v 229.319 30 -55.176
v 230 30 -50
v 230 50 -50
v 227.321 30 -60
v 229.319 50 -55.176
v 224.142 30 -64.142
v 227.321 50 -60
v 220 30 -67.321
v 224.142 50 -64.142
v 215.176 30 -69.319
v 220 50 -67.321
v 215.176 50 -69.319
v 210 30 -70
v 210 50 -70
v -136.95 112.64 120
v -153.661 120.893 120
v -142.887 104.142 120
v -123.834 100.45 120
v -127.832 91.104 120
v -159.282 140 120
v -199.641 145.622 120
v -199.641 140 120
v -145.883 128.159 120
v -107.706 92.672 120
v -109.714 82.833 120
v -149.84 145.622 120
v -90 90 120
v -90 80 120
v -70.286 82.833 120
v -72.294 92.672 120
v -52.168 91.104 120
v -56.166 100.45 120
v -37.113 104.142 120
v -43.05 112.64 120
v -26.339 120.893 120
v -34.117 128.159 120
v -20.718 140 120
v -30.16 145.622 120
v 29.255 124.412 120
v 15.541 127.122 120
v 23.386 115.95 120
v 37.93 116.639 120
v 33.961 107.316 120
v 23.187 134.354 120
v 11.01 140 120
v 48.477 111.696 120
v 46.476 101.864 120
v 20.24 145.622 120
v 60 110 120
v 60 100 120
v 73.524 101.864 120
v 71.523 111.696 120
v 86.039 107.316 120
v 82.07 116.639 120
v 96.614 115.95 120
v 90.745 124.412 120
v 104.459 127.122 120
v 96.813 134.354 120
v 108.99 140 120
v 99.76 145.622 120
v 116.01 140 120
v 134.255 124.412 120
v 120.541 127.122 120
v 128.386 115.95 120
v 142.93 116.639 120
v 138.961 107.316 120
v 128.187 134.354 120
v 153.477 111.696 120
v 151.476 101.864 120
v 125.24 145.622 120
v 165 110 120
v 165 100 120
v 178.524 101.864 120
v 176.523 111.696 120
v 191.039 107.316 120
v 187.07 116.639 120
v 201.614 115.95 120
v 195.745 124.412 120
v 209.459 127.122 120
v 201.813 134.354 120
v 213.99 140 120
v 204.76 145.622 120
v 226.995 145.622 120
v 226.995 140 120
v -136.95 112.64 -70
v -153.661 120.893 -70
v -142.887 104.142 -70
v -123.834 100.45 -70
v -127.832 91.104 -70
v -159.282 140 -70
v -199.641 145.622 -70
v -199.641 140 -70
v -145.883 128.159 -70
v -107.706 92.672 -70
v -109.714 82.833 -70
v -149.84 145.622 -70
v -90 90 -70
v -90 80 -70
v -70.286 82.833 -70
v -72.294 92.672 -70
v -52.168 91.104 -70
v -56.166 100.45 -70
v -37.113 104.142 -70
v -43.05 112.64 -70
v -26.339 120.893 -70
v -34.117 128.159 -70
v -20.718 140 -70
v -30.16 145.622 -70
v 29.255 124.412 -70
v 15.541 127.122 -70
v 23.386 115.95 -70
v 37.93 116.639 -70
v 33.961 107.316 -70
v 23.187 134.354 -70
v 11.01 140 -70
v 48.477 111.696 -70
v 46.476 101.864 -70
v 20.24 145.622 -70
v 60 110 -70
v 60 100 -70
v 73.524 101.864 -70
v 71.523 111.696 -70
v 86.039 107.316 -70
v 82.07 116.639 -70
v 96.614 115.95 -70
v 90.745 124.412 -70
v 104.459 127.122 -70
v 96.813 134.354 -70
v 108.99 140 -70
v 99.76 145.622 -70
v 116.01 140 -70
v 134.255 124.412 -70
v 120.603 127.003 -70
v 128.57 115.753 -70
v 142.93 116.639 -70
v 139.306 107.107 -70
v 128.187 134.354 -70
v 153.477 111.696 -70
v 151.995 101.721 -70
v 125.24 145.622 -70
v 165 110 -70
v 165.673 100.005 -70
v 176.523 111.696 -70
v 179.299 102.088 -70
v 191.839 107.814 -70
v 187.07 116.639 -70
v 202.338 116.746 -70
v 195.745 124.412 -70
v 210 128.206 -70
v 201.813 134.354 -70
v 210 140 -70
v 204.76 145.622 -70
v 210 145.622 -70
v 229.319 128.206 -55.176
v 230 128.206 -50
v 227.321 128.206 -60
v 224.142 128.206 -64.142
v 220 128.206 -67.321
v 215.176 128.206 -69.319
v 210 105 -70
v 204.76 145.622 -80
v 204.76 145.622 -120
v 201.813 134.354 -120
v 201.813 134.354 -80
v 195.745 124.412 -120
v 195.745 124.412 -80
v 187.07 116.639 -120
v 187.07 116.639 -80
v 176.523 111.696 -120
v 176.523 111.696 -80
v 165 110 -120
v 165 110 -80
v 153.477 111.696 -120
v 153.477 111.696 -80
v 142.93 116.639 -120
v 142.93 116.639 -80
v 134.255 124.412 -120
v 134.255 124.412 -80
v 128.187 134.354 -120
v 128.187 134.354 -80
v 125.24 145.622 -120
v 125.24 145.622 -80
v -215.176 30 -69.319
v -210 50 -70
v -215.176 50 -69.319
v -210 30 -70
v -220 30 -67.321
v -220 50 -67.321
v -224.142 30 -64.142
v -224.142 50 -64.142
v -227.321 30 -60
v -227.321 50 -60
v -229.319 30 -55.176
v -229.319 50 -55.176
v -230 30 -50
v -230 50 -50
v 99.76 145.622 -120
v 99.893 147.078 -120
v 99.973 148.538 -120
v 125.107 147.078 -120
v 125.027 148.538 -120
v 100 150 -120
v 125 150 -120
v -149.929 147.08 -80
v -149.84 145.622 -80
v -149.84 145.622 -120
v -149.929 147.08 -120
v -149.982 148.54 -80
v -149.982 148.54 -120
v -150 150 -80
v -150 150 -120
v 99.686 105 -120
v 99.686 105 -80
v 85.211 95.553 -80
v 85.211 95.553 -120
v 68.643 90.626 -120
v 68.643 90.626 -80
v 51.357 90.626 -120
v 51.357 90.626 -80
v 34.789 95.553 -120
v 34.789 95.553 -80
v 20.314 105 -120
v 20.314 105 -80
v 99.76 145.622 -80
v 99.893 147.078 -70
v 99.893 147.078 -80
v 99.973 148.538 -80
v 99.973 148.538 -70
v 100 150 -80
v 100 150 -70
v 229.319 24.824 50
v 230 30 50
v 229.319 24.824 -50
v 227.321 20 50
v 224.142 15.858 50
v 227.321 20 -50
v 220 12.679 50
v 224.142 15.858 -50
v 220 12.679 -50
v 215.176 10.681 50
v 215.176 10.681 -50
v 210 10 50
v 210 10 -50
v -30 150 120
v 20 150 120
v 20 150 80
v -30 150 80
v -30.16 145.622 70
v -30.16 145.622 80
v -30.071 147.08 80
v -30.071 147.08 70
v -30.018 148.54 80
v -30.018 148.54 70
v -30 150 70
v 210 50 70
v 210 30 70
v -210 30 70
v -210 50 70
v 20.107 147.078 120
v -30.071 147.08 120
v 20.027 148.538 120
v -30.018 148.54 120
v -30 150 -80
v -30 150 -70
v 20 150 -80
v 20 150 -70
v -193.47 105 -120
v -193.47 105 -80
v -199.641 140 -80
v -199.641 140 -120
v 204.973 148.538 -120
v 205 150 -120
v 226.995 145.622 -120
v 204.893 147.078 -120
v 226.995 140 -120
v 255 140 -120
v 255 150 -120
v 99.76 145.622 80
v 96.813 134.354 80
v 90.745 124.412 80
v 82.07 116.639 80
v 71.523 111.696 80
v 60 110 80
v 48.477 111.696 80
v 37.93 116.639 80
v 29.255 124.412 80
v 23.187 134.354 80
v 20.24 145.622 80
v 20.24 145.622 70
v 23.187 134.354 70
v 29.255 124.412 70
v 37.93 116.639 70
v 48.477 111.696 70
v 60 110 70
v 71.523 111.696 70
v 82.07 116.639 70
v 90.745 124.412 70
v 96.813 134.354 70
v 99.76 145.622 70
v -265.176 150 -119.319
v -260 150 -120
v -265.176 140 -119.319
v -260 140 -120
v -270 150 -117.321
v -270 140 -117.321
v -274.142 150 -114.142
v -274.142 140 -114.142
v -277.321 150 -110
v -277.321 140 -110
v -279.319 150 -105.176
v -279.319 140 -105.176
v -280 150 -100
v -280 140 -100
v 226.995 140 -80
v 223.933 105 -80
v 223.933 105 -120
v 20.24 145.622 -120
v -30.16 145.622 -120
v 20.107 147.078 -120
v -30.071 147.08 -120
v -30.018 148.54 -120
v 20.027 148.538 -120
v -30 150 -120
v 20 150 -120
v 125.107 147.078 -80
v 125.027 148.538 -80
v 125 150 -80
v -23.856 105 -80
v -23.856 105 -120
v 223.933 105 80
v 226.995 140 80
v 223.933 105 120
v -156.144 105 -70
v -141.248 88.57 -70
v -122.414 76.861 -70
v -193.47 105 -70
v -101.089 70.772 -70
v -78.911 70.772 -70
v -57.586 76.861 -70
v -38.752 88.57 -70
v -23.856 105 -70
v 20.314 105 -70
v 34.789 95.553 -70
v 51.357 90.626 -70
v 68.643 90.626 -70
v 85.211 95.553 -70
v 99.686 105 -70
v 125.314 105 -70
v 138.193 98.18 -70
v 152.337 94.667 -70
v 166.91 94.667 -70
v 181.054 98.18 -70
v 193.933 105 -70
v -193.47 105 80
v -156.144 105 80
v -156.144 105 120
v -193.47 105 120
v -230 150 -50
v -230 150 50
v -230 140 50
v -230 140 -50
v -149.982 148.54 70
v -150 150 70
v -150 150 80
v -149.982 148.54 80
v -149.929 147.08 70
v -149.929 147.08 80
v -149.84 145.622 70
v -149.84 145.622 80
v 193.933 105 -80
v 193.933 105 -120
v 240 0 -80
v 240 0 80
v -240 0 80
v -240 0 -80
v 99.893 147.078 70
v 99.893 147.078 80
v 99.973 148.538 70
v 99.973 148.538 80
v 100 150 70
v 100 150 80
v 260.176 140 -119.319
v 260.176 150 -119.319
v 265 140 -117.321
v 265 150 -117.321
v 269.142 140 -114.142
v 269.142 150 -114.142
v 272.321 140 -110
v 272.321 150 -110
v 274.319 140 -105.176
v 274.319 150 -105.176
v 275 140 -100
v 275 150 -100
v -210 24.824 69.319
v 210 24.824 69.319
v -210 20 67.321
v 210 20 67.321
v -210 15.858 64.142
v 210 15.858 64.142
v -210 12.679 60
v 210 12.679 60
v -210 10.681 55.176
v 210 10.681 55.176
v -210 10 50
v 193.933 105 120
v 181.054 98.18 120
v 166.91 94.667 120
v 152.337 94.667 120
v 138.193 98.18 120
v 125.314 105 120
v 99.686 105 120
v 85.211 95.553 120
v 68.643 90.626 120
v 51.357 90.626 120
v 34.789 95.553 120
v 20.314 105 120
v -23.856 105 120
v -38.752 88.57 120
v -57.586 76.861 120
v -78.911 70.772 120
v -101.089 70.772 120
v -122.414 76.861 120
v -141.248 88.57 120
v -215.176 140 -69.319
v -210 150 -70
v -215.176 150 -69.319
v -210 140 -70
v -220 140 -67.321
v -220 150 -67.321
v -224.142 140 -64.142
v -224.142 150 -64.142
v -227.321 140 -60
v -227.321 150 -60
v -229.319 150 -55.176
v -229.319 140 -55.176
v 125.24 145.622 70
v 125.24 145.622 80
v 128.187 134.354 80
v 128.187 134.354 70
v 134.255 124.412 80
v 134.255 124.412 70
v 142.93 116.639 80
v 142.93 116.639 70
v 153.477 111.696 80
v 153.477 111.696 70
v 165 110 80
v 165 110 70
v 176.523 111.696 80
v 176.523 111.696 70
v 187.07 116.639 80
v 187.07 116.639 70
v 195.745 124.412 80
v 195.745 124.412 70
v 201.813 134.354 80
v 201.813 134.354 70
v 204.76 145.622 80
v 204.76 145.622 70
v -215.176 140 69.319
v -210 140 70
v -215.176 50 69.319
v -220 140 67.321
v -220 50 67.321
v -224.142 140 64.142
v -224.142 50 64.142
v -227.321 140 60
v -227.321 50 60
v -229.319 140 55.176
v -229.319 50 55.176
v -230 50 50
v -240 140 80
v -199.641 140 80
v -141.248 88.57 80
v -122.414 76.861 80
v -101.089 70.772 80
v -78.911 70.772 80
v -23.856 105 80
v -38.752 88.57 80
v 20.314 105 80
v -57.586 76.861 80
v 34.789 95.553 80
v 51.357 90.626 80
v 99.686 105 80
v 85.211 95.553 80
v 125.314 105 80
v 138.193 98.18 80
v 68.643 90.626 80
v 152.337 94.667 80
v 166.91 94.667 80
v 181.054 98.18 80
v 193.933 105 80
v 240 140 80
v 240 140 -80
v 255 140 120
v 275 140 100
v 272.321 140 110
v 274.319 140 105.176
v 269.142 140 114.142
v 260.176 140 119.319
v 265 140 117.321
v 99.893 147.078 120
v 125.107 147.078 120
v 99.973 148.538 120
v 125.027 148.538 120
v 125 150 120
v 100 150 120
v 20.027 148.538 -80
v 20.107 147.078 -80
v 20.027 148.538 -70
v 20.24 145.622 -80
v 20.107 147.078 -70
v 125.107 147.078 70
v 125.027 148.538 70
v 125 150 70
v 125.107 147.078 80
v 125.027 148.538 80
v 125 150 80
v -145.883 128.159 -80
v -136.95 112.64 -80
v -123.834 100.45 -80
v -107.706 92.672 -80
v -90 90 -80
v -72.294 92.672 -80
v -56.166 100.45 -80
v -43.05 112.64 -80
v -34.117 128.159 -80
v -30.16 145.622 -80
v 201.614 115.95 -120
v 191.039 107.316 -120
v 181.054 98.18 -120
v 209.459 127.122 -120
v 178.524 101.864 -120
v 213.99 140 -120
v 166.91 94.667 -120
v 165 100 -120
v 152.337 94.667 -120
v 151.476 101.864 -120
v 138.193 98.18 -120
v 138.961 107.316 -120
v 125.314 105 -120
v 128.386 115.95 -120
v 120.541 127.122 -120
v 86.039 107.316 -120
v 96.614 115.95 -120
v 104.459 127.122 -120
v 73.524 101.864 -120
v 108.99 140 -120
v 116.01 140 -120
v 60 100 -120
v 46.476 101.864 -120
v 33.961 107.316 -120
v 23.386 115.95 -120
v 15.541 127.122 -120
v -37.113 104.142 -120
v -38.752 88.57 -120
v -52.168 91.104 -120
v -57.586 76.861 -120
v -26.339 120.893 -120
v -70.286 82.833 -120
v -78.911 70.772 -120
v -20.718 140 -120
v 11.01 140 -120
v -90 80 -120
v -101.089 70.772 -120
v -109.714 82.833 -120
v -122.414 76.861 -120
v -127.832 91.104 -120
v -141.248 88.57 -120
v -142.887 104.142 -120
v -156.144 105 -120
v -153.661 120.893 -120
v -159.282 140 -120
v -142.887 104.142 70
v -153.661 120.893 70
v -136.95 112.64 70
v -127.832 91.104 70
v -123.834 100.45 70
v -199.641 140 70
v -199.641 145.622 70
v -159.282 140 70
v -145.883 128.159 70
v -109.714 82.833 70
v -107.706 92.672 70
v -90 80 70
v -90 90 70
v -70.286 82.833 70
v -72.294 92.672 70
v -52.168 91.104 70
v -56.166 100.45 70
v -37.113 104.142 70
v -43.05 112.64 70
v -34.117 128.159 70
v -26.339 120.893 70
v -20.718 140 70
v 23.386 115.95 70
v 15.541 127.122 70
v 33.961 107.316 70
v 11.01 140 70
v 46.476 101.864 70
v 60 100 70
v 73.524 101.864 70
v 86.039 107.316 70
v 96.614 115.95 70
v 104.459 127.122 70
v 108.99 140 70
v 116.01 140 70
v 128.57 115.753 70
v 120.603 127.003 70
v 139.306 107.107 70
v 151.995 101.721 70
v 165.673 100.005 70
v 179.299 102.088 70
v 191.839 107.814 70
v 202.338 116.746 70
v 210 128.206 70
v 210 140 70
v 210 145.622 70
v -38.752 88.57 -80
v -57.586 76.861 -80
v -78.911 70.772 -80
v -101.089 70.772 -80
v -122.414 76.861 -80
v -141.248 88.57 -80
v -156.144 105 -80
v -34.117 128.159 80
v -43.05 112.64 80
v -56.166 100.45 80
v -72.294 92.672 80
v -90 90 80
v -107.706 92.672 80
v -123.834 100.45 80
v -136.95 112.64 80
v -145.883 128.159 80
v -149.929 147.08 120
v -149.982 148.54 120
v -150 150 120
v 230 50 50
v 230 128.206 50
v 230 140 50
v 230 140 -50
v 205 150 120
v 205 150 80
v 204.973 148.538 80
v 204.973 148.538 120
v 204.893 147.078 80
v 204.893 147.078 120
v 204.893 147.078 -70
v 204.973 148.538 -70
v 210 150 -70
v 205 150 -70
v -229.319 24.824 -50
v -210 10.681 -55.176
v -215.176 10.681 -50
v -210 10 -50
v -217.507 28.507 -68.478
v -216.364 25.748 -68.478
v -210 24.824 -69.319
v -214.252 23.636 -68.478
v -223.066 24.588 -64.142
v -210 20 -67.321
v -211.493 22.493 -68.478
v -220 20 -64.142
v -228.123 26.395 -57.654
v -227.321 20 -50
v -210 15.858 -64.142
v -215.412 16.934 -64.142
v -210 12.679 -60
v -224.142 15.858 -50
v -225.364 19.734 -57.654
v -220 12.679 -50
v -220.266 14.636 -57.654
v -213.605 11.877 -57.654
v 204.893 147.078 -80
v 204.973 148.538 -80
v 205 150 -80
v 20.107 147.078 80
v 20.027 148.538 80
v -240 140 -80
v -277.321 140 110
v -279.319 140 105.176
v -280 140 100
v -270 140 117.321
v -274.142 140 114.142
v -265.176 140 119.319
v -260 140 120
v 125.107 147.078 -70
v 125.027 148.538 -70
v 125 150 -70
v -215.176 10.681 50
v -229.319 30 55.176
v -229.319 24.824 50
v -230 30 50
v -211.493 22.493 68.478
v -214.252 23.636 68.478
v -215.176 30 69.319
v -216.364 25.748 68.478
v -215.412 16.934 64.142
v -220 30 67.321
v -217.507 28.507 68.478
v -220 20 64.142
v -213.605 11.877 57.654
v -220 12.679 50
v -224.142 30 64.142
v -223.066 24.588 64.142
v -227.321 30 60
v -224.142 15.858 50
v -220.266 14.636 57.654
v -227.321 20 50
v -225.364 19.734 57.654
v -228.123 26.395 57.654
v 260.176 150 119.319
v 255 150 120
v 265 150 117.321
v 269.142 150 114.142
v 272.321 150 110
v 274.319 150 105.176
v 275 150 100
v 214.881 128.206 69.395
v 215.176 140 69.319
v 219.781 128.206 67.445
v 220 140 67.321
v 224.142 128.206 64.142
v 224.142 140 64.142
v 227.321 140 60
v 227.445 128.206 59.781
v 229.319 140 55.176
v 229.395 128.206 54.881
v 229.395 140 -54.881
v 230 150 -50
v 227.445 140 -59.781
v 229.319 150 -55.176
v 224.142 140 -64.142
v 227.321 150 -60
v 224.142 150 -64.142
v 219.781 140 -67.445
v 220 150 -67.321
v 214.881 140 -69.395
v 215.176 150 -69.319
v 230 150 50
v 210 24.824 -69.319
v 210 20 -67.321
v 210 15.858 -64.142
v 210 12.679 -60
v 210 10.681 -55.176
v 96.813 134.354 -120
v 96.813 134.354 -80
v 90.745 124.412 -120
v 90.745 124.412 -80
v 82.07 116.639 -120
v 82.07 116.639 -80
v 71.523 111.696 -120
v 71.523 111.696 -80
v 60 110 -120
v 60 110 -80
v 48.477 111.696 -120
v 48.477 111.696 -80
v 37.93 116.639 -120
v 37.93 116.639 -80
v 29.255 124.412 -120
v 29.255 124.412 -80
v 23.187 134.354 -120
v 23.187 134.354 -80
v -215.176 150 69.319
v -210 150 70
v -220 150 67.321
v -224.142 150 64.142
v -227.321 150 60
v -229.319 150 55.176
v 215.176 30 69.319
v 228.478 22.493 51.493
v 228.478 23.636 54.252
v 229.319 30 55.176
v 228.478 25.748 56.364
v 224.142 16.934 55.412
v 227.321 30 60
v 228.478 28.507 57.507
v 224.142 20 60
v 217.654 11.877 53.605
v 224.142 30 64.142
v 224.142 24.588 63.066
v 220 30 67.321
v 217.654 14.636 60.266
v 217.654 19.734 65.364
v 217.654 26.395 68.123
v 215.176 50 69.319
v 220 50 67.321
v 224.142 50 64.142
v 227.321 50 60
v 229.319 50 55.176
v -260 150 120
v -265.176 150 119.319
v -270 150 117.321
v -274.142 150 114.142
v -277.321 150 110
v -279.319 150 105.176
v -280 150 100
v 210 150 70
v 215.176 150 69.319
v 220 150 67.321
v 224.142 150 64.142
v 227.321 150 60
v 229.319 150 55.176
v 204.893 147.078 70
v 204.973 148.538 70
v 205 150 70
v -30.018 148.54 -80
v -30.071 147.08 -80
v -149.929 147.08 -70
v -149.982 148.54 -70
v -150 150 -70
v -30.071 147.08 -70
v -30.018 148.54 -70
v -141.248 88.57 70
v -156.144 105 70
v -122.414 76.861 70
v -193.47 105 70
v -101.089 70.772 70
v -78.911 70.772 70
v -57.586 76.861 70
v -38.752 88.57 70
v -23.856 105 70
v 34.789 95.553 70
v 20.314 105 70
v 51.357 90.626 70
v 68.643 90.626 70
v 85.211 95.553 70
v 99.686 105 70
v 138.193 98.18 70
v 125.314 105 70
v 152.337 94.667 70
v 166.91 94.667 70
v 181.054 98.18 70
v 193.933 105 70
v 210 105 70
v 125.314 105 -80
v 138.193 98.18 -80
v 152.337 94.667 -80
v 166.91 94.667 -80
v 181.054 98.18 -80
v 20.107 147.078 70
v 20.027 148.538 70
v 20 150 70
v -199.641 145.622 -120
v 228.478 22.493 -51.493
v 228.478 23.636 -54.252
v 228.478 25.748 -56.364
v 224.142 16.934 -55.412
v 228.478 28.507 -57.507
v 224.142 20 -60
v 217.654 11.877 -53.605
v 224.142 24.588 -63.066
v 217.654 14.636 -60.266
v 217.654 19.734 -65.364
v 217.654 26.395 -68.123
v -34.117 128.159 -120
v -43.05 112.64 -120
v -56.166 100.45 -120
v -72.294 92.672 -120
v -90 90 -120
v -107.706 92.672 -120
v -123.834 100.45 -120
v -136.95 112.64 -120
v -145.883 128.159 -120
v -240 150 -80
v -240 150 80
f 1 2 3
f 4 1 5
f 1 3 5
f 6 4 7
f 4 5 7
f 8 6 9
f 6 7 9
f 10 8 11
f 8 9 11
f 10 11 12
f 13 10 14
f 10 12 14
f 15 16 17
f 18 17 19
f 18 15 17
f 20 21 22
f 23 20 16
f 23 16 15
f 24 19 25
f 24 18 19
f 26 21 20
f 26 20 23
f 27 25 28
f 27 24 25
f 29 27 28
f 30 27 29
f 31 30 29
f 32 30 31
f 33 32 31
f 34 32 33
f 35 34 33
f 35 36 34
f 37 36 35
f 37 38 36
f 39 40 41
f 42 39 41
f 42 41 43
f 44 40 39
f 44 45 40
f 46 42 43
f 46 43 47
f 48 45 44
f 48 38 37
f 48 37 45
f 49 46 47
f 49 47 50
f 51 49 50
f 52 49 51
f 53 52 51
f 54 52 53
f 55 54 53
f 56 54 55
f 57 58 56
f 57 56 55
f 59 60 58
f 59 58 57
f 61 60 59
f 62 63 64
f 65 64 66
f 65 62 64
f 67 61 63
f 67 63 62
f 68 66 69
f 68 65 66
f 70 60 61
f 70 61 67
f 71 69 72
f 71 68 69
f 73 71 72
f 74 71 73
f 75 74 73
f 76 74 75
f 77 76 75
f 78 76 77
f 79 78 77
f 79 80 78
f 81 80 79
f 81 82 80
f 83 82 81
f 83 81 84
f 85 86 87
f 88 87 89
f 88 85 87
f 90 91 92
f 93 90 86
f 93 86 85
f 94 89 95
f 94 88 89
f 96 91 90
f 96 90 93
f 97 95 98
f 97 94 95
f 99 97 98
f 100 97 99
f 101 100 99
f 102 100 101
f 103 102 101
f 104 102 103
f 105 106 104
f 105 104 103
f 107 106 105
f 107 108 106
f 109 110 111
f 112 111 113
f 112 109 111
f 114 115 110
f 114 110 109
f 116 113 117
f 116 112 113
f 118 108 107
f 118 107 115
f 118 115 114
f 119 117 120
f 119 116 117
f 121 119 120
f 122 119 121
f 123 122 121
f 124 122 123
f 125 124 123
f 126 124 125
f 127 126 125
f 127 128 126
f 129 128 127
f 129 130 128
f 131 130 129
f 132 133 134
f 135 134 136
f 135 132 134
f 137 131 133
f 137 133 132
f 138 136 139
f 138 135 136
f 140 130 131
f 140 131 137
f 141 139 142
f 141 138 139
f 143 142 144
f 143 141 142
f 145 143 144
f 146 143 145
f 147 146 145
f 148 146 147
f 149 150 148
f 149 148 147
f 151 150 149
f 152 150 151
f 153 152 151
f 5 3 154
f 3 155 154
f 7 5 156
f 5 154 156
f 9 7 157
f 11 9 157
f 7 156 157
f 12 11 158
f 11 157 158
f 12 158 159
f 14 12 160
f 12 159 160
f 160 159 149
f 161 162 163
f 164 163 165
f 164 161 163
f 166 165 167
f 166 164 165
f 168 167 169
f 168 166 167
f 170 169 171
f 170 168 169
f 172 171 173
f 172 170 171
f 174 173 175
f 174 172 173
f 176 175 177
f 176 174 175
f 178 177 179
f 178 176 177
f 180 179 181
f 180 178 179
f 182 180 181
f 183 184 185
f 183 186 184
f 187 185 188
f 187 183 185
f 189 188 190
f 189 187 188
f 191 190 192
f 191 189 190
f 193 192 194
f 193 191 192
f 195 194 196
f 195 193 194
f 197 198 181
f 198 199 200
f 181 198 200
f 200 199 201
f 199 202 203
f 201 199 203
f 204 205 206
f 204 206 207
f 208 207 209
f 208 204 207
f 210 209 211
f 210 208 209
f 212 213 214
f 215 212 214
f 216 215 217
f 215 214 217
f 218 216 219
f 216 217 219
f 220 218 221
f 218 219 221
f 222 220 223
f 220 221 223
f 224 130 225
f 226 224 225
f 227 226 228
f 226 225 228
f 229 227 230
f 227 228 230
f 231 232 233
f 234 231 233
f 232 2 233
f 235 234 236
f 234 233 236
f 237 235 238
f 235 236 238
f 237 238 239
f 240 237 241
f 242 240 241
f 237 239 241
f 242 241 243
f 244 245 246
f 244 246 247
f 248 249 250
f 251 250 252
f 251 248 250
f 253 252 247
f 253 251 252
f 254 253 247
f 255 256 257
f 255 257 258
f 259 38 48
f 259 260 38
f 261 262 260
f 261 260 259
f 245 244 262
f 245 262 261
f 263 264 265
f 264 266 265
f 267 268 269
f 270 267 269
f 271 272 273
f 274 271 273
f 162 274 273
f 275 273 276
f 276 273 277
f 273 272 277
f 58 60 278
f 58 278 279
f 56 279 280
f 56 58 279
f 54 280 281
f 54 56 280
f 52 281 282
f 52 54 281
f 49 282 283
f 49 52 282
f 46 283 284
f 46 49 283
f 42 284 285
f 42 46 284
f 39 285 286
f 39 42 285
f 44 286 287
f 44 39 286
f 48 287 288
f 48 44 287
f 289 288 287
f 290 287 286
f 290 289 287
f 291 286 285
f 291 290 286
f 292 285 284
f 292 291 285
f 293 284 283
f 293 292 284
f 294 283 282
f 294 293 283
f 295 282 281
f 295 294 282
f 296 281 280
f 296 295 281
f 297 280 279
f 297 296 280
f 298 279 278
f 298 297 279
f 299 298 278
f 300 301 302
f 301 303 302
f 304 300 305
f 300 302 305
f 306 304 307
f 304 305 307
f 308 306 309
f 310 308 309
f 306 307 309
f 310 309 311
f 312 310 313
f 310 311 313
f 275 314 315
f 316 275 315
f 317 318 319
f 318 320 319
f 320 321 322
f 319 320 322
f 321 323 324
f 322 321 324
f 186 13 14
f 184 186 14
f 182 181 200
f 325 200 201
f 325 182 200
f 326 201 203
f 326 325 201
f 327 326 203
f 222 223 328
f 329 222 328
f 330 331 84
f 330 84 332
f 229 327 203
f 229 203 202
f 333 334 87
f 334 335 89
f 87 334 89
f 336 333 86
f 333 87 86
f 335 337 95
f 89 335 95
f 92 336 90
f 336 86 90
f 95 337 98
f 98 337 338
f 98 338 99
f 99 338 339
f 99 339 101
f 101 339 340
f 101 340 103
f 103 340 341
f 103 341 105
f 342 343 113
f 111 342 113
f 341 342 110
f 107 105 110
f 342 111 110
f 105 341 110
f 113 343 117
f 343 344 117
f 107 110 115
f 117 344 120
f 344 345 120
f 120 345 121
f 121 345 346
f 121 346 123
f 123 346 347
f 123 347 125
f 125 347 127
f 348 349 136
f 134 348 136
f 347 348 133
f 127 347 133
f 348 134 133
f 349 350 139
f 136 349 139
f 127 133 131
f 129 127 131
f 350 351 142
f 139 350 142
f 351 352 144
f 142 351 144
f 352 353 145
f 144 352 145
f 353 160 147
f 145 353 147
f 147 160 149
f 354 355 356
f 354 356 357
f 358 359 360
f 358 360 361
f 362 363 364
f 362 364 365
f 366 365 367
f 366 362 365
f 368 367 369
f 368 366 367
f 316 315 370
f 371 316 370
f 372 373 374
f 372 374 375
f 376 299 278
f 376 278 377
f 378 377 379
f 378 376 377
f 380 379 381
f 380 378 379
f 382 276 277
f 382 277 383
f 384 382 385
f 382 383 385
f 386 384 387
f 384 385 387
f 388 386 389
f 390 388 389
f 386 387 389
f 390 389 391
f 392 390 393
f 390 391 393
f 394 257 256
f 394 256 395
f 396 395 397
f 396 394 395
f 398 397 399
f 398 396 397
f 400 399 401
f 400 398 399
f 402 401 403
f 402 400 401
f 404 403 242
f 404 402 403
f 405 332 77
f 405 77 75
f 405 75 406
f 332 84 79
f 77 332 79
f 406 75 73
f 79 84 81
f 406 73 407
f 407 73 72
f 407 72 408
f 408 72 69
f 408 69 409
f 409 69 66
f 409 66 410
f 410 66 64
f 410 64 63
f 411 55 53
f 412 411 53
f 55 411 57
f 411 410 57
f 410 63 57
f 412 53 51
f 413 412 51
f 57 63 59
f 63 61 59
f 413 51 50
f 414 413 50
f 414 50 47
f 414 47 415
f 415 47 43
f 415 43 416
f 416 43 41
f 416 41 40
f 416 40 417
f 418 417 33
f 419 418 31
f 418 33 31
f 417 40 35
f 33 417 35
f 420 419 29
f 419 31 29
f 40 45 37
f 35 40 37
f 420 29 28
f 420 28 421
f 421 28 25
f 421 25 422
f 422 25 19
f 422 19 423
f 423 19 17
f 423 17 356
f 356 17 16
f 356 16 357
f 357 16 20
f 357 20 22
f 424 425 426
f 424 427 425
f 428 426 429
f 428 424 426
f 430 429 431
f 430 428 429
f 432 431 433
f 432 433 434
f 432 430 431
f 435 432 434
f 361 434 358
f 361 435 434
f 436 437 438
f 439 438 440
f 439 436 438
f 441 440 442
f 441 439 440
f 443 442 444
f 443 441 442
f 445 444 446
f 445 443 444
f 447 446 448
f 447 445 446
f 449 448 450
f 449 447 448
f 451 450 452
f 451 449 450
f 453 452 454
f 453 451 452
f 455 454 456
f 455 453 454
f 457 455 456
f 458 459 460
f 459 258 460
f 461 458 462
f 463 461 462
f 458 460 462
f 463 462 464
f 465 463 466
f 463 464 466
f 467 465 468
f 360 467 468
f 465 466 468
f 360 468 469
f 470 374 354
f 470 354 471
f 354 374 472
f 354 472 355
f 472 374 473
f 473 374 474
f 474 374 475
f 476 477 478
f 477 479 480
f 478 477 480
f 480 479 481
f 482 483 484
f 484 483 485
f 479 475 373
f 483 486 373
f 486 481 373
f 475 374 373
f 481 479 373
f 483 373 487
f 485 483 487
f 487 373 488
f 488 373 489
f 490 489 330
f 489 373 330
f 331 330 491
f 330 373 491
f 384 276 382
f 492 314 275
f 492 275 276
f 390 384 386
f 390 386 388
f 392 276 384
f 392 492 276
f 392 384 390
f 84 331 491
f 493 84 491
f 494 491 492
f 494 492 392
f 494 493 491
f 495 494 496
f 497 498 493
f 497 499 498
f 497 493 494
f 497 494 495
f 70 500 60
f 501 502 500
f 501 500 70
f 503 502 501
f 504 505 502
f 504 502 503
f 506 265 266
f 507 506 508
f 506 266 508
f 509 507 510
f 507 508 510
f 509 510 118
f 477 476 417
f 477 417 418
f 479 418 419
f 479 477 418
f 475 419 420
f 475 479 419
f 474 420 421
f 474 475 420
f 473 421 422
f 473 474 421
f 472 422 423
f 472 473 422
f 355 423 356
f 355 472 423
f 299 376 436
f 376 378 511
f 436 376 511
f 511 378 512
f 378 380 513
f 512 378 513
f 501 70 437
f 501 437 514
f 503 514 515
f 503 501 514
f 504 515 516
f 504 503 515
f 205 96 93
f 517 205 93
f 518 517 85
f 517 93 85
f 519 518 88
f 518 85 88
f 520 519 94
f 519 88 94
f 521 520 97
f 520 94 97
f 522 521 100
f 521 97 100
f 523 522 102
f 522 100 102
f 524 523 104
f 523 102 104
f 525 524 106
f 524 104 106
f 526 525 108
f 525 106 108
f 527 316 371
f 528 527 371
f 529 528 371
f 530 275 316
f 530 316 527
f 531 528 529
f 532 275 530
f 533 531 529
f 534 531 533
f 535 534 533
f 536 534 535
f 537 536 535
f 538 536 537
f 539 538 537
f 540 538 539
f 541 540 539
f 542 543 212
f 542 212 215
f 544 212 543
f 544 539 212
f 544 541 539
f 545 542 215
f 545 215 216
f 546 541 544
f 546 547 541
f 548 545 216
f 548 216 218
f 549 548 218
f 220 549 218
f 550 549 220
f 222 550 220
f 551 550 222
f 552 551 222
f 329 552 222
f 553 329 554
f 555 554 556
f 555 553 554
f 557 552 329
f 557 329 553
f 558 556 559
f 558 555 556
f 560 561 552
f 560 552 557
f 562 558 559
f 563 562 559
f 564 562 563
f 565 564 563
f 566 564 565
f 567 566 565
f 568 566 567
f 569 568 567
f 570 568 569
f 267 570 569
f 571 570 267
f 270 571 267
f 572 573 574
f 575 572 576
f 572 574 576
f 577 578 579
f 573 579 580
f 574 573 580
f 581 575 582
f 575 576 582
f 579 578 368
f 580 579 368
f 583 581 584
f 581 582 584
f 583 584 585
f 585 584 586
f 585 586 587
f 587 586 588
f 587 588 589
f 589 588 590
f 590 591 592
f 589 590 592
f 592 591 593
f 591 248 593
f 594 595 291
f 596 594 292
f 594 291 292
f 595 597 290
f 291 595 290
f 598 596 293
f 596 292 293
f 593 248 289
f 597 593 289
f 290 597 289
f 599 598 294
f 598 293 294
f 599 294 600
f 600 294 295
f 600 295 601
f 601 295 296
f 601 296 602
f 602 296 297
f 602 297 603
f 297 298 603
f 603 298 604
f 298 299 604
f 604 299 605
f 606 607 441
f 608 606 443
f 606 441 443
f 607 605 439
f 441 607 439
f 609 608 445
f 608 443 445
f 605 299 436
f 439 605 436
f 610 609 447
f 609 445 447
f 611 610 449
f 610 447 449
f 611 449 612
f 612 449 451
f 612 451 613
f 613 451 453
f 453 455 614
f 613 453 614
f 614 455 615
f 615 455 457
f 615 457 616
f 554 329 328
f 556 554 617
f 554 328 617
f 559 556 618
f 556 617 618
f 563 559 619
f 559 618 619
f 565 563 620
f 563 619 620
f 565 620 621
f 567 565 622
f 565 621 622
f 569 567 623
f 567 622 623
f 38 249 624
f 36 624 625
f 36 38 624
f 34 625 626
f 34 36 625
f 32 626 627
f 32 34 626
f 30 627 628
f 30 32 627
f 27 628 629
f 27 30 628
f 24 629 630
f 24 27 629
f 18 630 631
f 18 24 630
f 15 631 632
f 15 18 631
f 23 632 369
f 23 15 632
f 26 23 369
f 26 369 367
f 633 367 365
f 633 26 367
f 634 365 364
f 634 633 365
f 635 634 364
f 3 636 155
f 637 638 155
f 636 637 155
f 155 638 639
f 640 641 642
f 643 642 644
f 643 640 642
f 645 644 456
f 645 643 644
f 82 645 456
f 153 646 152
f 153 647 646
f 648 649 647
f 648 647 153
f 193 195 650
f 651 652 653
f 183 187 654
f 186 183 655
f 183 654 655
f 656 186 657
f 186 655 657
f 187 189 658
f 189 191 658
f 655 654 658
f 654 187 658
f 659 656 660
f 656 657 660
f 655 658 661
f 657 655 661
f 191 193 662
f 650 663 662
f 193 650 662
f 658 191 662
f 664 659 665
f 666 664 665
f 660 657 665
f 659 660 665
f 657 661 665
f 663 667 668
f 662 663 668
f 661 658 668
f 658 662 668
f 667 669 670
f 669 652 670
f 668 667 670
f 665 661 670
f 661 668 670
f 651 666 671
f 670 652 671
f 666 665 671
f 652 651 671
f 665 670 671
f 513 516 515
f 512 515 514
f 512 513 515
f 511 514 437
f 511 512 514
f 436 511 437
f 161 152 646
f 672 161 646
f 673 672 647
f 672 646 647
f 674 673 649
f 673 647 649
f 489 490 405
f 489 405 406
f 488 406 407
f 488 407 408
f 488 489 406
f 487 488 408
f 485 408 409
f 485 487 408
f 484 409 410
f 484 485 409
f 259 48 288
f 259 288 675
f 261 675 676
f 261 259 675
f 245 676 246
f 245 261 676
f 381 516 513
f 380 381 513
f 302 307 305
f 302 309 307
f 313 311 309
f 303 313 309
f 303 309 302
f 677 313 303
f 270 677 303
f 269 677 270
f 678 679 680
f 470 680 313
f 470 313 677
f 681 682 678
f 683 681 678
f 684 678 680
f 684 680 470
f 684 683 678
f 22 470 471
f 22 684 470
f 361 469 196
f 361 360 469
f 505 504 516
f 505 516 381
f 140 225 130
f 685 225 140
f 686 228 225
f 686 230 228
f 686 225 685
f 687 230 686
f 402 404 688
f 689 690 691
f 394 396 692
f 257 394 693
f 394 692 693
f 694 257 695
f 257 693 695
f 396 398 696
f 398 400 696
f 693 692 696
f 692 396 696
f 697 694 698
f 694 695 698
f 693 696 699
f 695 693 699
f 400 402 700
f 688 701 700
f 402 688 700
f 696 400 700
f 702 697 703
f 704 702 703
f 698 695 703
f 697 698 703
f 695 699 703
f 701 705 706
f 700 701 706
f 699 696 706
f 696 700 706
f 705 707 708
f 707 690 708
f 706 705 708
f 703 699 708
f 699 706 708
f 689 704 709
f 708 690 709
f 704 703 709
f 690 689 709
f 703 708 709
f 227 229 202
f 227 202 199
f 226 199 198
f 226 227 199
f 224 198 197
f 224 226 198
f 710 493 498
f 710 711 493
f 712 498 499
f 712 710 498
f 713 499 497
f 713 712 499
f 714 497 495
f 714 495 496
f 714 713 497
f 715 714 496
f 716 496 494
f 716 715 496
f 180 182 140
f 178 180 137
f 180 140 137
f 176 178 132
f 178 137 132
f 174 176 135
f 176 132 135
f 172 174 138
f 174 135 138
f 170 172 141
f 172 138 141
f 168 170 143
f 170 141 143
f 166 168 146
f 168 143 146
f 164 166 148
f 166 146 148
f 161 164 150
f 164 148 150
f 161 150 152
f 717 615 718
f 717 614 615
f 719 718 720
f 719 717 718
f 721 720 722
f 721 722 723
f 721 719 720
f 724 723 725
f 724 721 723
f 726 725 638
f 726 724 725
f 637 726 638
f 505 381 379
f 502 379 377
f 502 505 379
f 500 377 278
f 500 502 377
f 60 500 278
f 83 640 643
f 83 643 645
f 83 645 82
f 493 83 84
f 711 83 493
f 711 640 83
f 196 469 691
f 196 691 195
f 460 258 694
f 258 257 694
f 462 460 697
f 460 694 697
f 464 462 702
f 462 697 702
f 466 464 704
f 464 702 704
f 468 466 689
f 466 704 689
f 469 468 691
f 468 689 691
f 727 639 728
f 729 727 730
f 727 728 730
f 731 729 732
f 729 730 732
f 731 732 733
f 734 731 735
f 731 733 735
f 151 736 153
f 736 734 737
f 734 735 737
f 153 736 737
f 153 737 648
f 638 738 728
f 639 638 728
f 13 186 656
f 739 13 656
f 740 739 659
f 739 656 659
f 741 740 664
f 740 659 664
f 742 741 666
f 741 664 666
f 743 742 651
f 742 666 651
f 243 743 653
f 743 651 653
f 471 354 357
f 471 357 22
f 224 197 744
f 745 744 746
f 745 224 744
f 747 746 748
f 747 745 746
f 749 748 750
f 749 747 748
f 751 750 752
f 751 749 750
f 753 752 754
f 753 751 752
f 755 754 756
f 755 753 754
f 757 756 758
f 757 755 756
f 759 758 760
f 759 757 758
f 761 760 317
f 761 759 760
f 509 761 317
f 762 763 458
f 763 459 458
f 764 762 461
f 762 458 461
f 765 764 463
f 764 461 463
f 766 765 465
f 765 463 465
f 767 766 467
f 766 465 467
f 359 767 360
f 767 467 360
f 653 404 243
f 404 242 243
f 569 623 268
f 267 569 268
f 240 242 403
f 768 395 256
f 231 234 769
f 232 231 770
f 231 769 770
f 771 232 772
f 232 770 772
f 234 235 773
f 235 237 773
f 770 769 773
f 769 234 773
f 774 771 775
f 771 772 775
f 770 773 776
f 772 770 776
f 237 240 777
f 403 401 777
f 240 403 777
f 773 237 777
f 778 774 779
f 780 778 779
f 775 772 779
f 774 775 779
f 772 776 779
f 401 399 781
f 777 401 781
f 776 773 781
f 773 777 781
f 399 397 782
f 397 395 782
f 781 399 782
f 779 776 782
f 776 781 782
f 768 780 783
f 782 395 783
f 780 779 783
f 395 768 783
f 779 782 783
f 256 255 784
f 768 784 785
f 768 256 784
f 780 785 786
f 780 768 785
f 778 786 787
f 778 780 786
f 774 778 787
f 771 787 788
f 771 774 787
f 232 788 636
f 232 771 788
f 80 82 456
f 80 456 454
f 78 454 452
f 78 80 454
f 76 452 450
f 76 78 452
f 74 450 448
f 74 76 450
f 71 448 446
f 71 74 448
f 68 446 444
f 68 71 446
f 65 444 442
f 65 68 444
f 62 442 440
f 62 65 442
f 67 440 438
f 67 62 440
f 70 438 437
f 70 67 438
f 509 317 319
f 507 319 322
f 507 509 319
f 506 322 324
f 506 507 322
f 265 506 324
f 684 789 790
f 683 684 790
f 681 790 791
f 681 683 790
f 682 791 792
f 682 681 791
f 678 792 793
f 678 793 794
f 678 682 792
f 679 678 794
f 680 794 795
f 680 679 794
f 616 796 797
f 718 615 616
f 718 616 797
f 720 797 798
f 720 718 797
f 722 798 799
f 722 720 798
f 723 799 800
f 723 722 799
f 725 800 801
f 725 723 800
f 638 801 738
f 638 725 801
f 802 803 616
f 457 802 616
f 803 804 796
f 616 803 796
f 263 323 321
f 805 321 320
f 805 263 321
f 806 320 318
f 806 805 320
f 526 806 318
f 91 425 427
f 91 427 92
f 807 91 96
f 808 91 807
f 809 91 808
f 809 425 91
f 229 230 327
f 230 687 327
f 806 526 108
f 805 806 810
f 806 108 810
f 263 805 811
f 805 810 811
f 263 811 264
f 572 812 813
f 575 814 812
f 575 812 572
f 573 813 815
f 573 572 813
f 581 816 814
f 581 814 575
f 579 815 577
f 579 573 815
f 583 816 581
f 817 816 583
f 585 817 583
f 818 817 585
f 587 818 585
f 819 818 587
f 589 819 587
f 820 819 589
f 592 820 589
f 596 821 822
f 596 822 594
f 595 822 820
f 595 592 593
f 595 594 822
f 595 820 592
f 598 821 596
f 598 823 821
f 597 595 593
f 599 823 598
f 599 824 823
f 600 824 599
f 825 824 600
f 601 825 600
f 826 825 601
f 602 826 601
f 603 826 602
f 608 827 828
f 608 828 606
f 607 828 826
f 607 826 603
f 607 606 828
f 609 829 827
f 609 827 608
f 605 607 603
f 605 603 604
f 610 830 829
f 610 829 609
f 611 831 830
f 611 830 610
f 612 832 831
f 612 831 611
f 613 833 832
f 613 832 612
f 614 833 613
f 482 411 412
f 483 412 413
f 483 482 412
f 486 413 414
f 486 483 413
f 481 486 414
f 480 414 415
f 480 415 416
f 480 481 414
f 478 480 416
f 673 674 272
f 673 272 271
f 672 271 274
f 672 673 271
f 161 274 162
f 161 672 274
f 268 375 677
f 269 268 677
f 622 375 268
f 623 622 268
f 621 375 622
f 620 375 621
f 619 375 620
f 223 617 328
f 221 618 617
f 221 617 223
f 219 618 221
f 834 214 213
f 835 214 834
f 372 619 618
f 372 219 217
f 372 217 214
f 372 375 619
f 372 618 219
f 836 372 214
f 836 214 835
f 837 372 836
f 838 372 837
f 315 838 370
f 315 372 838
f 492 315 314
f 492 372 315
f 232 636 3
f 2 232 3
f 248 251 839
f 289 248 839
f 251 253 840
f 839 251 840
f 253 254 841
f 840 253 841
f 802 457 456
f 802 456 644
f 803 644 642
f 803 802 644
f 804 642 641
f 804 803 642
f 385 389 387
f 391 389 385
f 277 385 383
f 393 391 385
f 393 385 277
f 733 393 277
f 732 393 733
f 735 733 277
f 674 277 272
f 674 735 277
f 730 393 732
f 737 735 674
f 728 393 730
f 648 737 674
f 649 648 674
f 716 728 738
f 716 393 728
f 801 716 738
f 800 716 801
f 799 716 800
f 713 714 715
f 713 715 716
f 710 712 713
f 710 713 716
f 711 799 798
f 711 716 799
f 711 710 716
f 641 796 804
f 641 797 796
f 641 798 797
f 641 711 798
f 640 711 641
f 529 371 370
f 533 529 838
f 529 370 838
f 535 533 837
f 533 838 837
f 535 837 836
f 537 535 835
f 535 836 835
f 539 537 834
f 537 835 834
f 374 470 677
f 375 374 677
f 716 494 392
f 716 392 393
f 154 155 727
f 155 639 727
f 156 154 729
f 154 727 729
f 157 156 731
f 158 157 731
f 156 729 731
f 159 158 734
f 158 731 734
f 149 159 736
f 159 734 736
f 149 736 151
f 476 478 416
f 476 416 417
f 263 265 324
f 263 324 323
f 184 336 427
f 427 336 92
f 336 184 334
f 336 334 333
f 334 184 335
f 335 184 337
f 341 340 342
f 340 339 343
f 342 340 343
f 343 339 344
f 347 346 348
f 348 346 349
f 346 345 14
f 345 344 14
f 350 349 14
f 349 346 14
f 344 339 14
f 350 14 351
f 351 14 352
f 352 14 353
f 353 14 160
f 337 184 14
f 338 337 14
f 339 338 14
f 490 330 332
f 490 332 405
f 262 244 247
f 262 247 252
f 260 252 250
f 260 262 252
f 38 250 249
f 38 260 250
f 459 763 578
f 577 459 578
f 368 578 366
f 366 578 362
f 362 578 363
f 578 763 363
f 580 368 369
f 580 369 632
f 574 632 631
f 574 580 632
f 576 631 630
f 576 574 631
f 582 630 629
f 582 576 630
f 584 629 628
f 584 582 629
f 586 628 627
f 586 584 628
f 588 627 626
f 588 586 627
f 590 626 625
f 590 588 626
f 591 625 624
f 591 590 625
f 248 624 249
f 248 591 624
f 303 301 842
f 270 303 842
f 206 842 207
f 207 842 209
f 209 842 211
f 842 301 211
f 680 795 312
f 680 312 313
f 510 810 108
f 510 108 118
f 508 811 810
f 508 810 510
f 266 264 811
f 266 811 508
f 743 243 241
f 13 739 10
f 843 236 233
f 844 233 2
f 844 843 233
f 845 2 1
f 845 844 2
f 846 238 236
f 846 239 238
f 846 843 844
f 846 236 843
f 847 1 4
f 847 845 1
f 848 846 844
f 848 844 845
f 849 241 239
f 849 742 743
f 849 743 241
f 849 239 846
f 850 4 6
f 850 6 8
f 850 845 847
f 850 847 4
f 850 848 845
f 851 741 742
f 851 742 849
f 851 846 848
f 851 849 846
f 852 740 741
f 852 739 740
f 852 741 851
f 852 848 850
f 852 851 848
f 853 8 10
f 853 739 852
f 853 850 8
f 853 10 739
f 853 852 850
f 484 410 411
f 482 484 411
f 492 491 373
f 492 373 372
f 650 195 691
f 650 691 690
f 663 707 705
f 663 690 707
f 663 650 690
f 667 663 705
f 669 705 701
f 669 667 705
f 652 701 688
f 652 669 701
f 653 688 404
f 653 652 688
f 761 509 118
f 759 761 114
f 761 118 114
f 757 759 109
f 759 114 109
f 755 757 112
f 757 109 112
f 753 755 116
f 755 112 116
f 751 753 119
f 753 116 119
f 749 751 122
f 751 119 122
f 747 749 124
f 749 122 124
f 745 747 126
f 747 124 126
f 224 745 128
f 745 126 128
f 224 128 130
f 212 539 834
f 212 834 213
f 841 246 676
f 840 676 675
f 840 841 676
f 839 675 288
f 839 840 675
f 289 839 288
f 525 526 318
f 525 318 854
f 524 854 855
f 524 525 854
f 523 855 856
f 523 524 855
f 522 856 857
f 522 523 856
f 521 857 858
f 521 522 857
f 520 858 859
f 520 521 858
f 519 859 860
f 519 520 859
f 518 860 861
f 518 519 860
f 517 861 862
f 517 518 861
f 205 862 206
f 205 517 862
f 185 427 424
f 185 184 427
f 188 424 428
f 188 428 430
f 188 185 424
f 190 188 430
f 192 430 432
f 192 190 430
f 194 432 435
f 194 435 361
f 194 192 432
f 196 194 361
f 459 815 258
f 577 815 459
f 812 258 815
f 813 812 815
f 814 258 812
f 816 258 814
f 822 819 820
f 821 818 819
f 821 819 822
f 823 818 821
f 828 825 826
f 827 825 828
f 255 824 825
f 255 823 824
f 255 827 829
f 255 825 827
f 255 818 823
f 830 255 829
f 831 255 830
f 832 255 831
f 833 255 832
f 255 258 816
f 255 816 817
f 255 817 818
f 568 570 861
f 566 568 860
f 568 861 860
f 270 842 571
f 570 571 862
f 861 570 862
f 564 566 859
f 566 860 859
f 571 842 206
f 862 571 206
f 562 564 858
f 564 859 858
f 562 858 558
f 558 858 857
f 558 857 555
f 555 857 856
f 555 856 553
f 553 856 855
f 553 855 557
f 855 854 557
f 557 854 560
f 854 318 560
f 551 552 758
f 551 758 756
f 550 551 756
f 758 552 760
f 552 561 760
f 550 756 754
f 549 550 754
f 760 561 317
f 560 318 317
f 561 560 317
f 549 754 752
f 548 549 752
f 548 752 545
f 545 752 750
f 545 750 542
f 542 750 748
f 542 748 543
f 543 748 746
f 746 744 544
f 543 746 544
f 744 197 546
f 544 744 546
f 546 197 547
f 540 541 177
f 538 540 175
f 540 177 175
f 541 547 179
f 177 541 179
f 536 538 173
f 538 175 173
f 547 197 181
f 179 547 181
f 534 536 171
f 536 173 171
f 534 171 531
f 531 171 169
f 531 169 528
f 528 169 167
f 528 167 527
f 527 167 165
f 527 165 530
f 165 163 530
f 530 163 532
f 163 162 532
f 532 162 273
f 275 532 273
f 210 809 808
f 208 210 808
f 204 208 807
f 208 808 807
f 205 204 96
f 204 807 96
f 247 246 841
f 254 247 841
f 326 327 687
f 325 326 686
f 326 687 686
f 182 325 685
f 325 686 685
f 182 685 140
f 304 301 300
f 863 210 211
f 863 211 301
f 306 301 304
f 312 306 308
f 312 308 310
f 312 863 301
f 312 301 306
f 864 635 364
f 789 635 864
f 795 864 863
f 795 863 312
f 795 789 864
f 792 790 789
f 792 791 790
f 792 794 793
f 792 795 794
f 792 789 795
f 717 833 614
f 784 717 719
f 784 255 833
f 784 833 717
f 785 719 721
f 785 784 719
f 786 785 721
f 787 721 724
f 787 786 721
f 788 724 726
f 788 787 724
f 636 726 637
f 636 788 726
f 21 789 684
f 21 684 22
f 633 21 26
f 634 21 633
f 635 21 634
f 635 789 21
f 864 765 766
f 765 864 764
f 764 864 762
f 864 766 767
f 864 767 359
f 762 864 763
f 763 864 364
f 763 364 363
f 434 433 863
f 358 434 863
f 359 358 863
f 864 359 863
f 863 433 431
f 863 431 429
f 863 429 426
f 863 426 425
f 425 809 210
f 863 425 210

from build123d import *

# Parameters (mm, degrees)
SKETCH1_W               = 160
SKETCH1_H               = 150
BOSS_EXTRUDE1_DEPTH     = 240
SHELL1_T                = -10
SKETCH2_R               = 60
SKETCH2_R_2             = 40
CUT_EXTRUDE1_DEPTH      = 81
CUT_EXTRUDE1_DEPTH_BACK = 81
EXTRUDE_THIN1_DEPTH     = 120
SKETCH4_W               = 460
SKETCH4_H               = 140
CUT_EXTRUDE2_DEPTH      = 100
FILLET1_R               = 20
FILLET2_R               = 20
BOSS_EXTRUDE2_START     = 70
BOSS_EXTRUDE2_DEPTH     = 50
BOSS_EXTRUDE3_START     = -70
BOSS_EXTRUDE3_DEPTH     = 50


with BuildPart() as part:
    # Sketch1 → Boss-Extrude1 (new body, symmetric)
    with BuildSketch(Plane(origin=(0, 0, 0), x_dir=(0, 0, -1), z_dir=(1, 0, 0))):
        with Locations((0, 75)):
            Rectangle(SKETCH1_W, SKETCH1_H)
    extrude(amount=BOSS_EXTRUDE1_DEPTH, both=True)

    # Shell1
    shell1_openings = [part.faces().sort_by_distance(p)[0] for p in [
        (0, 150, 0),
    ]]
    offset(amount=SHELL1_T, openings=shell1_openings, kind=Kind.INTERSECTION)

    # Sketch2 → Cut-Extrude1 (cut, two sides)
    with BuildSketch(Plane.XY) as cut_extrude1_sk:
        with Locations((-90, 150)):
            Circle(SKETCH2_R)
        with Locations((60, 150)):
            Circle(SKETCH2_R_2)
        with Locations((165, 150)):
            Circle(SKETCH2_R_2)
    extrude(amount=CUT_EXTRUDE1_DEPTH, mode=Mode.SUBTRACT)
    extrude(cut_extrude1_sk.sketch, amount=-CUT_EXTRUDE1_DEPTH_BACK, mode=Mode.SUBTRACT)

    # Sketch3 → Extrude-Thin1 (add, symmetric)
    with BuildSketch(Plane.XY):
        with BuildLine():
            Line((275, 150), (205, 150))
            ThreePointArc((205, 150), (165, 110), (125, 150))
            Line((125, 150), (100, 150))
            ThreePointArc((100, 150), (60, 110), (20, 150))
            Line((20, 150), (-30, 150))
            ThreePointArc((-30, 150), (-90, 90), (-150, 150))
            Line((-150, 150), (-280, 150))
            Line((-280, 150), (-280, 140))
            Line((-280, 140), (-159.282032303, 140))
            ThreePointArc((-159.282032303, 140), (-90, 80), (-20.717967697, 140))
            Line((-20.717967697, 140), (11.010205144, 140))
            ThreePointArc((11.010205144, 140), (60, 100), (108.989794856, 140))
            Line((108.989794856, 140), (116.010205144, 140))
            ThreePointArc((116.010205144, 140), (165, 100), (213.989794856, 140))
            Line((213.989794856, 140), (275, 140))
            Line((275, 140), (275, 150))
        make_face()
    extrude(amount=EXTRUDE_THIN1_DEPTH, both=True)

    # Sketch4 → Cut-Extrude2 (cut)
    with BuildSketch(Plane(origin=(0, 150, 0), x_dir=(1, 0, 0), z_dir=(0, 1, 0))):
        Rectangle(SKETCH4_W, SKETCH4_H)
    extrude(amount=-CUT_EXTRUDE2_DEPTH, mode=Mode.SUBTRACT)

    # Fillet1
    fillet1_edges = [part.edges().sort_by_distance(p)[0] for p in [
        (275, 145, 120),
        (-280, 145, 120),
        (-280, 145, -120),
        (275, 145, -120),
    ]]
    fillet(fillet1_edges, radius=FILLET1_R)

    # Fillet2
    fillet2_edges = [part.edges().sort_by_distance(p)[0] for p in [
        (-230, 10, 0),
        (0, 10, 70),
        (-230, 80, -70),
        (0, 10, -70),
        (230, 10, 0),
        (230, 80, -70),
        (-230, 80, 70),
        (230, 80, 70),
    ]]
    fillet(fillet2_edges, radius=FILLET2_R)

    # Sketch5 → Boss-Extrude2 (add)
    with BuildSketch(Plane.XY.offset(BOSS_EXTRUDE2_START)):
        with BuildLine():
            Line((226.994897428, 140), (223.932794204, 105))
            Line((223.932794204, 105), (193.932794204, 105))
            ThreePointArc((193.932794204, 105), (159.623262269, 94.22251536), (125.313730334, 105))
            Line((125.313730334, 105), (99.686269666, 105))
            ThreePointArc((99.686269666, 105), (60, 90), (20.313730334, 105))
            Line((20.313730334, 105), (-23.856217223, 105))
            ThreePointArc((-23.856217223, 105), (-90, 70), (-156.143782777, 105))
            Line((-156.143782777, 105), (-193.469571827, 105))
            Line((-193.469571827, 105), (-199.641016151, 140))
            Line((-199.641016151, 140), (-199.641016151, 145.622193668))
            Line((-199.641016151, 145.622193668), (-149.84007697, 145.622193668))
            ThreePointArc((-149.84007697, 145.622193668), (-90, 90), (-30.15992303, 145.622193668))
            Line((-30.15992303, 145.622193668), (20.240286574, 145.622193668))
            ThreePointArc((20.240286574, 145.622193668), (60, 110), (99.759713426, 145.622193668))
            Line((99.759713426, 145.622193668), (125.240286574, 145.622193668))
            ThreePointArc((125.240286574, 145.622193668), (165, 110), (204.759713426, 145.622193668))
            Line((204.759713426, 145.622193668), (226.994897428, 145.622193668))
            Line((226.994897428, 145.622193668), (226.994897428, 140))
        make_face()
    extrude(amount=BOSS_EXTRUDE2_DEPTH)

    # Sketch5_3 → Boss-Extrude3 (add)
    with BuildSketch(Plane.XY.offset(BOSS_EXTRUDE3_START)):
        with BuildLine():
            Line((226.994897428, 140), (223.932794204, 105))
            Line((223.932794204, 105), (193.932794204, 105))
            ThreePointArc((193.932794204, 105), (159.623262269, 94.22251536), (125.313730334, 105))
            Line((125.313730334, 105), (99.686269666, 105))
            ThreePointArc((99.686269666, 105), (60, 90), (20.313730334, 105))
            Line((20.313730334, 105), (-23.856217223, 105))
            ThreePointArc((-23.856217223, 105), (-90, 70), (-156.143782777, 105))
            Line((-156.143782777, 105), (-193.469571827, 105))
            Line((-193.469571827, 105), (-199.641016151, 140))
            Line((-199.641016151, 140), (-199.641016151, 145.622193668))
            Line((-199.641016151, 145.622193668), (-149.84007697, 145.622193668))
            ThreePointArc((-149.84007697, 145.622193668), (-90, 90), (-30.15992303, 145.622193668))
            Line((-30.15992303, 145.622193668), (20.240286574, 145.622193668))
            ThreePointArc((20.240286574, 145.622193668), (60, 110), (99.759713426, 145.622193668))
            Line((99.759713426, 145.622193668), (125.240286574, 145.622193668))
            ThreePointArc((125.240286574, 145.622193668), (165, 110), (204.759713426, 145.622193668))
            Line((204.759713426, 145.622193668), (226.994897428, 145.622193668))
            Line((226.994897428, 145.622193668), (226.994897428, 140))
        make_face()
    extrude(amount=-BOSS_EXTRUDE3_DEPTH)


solid = part.part
